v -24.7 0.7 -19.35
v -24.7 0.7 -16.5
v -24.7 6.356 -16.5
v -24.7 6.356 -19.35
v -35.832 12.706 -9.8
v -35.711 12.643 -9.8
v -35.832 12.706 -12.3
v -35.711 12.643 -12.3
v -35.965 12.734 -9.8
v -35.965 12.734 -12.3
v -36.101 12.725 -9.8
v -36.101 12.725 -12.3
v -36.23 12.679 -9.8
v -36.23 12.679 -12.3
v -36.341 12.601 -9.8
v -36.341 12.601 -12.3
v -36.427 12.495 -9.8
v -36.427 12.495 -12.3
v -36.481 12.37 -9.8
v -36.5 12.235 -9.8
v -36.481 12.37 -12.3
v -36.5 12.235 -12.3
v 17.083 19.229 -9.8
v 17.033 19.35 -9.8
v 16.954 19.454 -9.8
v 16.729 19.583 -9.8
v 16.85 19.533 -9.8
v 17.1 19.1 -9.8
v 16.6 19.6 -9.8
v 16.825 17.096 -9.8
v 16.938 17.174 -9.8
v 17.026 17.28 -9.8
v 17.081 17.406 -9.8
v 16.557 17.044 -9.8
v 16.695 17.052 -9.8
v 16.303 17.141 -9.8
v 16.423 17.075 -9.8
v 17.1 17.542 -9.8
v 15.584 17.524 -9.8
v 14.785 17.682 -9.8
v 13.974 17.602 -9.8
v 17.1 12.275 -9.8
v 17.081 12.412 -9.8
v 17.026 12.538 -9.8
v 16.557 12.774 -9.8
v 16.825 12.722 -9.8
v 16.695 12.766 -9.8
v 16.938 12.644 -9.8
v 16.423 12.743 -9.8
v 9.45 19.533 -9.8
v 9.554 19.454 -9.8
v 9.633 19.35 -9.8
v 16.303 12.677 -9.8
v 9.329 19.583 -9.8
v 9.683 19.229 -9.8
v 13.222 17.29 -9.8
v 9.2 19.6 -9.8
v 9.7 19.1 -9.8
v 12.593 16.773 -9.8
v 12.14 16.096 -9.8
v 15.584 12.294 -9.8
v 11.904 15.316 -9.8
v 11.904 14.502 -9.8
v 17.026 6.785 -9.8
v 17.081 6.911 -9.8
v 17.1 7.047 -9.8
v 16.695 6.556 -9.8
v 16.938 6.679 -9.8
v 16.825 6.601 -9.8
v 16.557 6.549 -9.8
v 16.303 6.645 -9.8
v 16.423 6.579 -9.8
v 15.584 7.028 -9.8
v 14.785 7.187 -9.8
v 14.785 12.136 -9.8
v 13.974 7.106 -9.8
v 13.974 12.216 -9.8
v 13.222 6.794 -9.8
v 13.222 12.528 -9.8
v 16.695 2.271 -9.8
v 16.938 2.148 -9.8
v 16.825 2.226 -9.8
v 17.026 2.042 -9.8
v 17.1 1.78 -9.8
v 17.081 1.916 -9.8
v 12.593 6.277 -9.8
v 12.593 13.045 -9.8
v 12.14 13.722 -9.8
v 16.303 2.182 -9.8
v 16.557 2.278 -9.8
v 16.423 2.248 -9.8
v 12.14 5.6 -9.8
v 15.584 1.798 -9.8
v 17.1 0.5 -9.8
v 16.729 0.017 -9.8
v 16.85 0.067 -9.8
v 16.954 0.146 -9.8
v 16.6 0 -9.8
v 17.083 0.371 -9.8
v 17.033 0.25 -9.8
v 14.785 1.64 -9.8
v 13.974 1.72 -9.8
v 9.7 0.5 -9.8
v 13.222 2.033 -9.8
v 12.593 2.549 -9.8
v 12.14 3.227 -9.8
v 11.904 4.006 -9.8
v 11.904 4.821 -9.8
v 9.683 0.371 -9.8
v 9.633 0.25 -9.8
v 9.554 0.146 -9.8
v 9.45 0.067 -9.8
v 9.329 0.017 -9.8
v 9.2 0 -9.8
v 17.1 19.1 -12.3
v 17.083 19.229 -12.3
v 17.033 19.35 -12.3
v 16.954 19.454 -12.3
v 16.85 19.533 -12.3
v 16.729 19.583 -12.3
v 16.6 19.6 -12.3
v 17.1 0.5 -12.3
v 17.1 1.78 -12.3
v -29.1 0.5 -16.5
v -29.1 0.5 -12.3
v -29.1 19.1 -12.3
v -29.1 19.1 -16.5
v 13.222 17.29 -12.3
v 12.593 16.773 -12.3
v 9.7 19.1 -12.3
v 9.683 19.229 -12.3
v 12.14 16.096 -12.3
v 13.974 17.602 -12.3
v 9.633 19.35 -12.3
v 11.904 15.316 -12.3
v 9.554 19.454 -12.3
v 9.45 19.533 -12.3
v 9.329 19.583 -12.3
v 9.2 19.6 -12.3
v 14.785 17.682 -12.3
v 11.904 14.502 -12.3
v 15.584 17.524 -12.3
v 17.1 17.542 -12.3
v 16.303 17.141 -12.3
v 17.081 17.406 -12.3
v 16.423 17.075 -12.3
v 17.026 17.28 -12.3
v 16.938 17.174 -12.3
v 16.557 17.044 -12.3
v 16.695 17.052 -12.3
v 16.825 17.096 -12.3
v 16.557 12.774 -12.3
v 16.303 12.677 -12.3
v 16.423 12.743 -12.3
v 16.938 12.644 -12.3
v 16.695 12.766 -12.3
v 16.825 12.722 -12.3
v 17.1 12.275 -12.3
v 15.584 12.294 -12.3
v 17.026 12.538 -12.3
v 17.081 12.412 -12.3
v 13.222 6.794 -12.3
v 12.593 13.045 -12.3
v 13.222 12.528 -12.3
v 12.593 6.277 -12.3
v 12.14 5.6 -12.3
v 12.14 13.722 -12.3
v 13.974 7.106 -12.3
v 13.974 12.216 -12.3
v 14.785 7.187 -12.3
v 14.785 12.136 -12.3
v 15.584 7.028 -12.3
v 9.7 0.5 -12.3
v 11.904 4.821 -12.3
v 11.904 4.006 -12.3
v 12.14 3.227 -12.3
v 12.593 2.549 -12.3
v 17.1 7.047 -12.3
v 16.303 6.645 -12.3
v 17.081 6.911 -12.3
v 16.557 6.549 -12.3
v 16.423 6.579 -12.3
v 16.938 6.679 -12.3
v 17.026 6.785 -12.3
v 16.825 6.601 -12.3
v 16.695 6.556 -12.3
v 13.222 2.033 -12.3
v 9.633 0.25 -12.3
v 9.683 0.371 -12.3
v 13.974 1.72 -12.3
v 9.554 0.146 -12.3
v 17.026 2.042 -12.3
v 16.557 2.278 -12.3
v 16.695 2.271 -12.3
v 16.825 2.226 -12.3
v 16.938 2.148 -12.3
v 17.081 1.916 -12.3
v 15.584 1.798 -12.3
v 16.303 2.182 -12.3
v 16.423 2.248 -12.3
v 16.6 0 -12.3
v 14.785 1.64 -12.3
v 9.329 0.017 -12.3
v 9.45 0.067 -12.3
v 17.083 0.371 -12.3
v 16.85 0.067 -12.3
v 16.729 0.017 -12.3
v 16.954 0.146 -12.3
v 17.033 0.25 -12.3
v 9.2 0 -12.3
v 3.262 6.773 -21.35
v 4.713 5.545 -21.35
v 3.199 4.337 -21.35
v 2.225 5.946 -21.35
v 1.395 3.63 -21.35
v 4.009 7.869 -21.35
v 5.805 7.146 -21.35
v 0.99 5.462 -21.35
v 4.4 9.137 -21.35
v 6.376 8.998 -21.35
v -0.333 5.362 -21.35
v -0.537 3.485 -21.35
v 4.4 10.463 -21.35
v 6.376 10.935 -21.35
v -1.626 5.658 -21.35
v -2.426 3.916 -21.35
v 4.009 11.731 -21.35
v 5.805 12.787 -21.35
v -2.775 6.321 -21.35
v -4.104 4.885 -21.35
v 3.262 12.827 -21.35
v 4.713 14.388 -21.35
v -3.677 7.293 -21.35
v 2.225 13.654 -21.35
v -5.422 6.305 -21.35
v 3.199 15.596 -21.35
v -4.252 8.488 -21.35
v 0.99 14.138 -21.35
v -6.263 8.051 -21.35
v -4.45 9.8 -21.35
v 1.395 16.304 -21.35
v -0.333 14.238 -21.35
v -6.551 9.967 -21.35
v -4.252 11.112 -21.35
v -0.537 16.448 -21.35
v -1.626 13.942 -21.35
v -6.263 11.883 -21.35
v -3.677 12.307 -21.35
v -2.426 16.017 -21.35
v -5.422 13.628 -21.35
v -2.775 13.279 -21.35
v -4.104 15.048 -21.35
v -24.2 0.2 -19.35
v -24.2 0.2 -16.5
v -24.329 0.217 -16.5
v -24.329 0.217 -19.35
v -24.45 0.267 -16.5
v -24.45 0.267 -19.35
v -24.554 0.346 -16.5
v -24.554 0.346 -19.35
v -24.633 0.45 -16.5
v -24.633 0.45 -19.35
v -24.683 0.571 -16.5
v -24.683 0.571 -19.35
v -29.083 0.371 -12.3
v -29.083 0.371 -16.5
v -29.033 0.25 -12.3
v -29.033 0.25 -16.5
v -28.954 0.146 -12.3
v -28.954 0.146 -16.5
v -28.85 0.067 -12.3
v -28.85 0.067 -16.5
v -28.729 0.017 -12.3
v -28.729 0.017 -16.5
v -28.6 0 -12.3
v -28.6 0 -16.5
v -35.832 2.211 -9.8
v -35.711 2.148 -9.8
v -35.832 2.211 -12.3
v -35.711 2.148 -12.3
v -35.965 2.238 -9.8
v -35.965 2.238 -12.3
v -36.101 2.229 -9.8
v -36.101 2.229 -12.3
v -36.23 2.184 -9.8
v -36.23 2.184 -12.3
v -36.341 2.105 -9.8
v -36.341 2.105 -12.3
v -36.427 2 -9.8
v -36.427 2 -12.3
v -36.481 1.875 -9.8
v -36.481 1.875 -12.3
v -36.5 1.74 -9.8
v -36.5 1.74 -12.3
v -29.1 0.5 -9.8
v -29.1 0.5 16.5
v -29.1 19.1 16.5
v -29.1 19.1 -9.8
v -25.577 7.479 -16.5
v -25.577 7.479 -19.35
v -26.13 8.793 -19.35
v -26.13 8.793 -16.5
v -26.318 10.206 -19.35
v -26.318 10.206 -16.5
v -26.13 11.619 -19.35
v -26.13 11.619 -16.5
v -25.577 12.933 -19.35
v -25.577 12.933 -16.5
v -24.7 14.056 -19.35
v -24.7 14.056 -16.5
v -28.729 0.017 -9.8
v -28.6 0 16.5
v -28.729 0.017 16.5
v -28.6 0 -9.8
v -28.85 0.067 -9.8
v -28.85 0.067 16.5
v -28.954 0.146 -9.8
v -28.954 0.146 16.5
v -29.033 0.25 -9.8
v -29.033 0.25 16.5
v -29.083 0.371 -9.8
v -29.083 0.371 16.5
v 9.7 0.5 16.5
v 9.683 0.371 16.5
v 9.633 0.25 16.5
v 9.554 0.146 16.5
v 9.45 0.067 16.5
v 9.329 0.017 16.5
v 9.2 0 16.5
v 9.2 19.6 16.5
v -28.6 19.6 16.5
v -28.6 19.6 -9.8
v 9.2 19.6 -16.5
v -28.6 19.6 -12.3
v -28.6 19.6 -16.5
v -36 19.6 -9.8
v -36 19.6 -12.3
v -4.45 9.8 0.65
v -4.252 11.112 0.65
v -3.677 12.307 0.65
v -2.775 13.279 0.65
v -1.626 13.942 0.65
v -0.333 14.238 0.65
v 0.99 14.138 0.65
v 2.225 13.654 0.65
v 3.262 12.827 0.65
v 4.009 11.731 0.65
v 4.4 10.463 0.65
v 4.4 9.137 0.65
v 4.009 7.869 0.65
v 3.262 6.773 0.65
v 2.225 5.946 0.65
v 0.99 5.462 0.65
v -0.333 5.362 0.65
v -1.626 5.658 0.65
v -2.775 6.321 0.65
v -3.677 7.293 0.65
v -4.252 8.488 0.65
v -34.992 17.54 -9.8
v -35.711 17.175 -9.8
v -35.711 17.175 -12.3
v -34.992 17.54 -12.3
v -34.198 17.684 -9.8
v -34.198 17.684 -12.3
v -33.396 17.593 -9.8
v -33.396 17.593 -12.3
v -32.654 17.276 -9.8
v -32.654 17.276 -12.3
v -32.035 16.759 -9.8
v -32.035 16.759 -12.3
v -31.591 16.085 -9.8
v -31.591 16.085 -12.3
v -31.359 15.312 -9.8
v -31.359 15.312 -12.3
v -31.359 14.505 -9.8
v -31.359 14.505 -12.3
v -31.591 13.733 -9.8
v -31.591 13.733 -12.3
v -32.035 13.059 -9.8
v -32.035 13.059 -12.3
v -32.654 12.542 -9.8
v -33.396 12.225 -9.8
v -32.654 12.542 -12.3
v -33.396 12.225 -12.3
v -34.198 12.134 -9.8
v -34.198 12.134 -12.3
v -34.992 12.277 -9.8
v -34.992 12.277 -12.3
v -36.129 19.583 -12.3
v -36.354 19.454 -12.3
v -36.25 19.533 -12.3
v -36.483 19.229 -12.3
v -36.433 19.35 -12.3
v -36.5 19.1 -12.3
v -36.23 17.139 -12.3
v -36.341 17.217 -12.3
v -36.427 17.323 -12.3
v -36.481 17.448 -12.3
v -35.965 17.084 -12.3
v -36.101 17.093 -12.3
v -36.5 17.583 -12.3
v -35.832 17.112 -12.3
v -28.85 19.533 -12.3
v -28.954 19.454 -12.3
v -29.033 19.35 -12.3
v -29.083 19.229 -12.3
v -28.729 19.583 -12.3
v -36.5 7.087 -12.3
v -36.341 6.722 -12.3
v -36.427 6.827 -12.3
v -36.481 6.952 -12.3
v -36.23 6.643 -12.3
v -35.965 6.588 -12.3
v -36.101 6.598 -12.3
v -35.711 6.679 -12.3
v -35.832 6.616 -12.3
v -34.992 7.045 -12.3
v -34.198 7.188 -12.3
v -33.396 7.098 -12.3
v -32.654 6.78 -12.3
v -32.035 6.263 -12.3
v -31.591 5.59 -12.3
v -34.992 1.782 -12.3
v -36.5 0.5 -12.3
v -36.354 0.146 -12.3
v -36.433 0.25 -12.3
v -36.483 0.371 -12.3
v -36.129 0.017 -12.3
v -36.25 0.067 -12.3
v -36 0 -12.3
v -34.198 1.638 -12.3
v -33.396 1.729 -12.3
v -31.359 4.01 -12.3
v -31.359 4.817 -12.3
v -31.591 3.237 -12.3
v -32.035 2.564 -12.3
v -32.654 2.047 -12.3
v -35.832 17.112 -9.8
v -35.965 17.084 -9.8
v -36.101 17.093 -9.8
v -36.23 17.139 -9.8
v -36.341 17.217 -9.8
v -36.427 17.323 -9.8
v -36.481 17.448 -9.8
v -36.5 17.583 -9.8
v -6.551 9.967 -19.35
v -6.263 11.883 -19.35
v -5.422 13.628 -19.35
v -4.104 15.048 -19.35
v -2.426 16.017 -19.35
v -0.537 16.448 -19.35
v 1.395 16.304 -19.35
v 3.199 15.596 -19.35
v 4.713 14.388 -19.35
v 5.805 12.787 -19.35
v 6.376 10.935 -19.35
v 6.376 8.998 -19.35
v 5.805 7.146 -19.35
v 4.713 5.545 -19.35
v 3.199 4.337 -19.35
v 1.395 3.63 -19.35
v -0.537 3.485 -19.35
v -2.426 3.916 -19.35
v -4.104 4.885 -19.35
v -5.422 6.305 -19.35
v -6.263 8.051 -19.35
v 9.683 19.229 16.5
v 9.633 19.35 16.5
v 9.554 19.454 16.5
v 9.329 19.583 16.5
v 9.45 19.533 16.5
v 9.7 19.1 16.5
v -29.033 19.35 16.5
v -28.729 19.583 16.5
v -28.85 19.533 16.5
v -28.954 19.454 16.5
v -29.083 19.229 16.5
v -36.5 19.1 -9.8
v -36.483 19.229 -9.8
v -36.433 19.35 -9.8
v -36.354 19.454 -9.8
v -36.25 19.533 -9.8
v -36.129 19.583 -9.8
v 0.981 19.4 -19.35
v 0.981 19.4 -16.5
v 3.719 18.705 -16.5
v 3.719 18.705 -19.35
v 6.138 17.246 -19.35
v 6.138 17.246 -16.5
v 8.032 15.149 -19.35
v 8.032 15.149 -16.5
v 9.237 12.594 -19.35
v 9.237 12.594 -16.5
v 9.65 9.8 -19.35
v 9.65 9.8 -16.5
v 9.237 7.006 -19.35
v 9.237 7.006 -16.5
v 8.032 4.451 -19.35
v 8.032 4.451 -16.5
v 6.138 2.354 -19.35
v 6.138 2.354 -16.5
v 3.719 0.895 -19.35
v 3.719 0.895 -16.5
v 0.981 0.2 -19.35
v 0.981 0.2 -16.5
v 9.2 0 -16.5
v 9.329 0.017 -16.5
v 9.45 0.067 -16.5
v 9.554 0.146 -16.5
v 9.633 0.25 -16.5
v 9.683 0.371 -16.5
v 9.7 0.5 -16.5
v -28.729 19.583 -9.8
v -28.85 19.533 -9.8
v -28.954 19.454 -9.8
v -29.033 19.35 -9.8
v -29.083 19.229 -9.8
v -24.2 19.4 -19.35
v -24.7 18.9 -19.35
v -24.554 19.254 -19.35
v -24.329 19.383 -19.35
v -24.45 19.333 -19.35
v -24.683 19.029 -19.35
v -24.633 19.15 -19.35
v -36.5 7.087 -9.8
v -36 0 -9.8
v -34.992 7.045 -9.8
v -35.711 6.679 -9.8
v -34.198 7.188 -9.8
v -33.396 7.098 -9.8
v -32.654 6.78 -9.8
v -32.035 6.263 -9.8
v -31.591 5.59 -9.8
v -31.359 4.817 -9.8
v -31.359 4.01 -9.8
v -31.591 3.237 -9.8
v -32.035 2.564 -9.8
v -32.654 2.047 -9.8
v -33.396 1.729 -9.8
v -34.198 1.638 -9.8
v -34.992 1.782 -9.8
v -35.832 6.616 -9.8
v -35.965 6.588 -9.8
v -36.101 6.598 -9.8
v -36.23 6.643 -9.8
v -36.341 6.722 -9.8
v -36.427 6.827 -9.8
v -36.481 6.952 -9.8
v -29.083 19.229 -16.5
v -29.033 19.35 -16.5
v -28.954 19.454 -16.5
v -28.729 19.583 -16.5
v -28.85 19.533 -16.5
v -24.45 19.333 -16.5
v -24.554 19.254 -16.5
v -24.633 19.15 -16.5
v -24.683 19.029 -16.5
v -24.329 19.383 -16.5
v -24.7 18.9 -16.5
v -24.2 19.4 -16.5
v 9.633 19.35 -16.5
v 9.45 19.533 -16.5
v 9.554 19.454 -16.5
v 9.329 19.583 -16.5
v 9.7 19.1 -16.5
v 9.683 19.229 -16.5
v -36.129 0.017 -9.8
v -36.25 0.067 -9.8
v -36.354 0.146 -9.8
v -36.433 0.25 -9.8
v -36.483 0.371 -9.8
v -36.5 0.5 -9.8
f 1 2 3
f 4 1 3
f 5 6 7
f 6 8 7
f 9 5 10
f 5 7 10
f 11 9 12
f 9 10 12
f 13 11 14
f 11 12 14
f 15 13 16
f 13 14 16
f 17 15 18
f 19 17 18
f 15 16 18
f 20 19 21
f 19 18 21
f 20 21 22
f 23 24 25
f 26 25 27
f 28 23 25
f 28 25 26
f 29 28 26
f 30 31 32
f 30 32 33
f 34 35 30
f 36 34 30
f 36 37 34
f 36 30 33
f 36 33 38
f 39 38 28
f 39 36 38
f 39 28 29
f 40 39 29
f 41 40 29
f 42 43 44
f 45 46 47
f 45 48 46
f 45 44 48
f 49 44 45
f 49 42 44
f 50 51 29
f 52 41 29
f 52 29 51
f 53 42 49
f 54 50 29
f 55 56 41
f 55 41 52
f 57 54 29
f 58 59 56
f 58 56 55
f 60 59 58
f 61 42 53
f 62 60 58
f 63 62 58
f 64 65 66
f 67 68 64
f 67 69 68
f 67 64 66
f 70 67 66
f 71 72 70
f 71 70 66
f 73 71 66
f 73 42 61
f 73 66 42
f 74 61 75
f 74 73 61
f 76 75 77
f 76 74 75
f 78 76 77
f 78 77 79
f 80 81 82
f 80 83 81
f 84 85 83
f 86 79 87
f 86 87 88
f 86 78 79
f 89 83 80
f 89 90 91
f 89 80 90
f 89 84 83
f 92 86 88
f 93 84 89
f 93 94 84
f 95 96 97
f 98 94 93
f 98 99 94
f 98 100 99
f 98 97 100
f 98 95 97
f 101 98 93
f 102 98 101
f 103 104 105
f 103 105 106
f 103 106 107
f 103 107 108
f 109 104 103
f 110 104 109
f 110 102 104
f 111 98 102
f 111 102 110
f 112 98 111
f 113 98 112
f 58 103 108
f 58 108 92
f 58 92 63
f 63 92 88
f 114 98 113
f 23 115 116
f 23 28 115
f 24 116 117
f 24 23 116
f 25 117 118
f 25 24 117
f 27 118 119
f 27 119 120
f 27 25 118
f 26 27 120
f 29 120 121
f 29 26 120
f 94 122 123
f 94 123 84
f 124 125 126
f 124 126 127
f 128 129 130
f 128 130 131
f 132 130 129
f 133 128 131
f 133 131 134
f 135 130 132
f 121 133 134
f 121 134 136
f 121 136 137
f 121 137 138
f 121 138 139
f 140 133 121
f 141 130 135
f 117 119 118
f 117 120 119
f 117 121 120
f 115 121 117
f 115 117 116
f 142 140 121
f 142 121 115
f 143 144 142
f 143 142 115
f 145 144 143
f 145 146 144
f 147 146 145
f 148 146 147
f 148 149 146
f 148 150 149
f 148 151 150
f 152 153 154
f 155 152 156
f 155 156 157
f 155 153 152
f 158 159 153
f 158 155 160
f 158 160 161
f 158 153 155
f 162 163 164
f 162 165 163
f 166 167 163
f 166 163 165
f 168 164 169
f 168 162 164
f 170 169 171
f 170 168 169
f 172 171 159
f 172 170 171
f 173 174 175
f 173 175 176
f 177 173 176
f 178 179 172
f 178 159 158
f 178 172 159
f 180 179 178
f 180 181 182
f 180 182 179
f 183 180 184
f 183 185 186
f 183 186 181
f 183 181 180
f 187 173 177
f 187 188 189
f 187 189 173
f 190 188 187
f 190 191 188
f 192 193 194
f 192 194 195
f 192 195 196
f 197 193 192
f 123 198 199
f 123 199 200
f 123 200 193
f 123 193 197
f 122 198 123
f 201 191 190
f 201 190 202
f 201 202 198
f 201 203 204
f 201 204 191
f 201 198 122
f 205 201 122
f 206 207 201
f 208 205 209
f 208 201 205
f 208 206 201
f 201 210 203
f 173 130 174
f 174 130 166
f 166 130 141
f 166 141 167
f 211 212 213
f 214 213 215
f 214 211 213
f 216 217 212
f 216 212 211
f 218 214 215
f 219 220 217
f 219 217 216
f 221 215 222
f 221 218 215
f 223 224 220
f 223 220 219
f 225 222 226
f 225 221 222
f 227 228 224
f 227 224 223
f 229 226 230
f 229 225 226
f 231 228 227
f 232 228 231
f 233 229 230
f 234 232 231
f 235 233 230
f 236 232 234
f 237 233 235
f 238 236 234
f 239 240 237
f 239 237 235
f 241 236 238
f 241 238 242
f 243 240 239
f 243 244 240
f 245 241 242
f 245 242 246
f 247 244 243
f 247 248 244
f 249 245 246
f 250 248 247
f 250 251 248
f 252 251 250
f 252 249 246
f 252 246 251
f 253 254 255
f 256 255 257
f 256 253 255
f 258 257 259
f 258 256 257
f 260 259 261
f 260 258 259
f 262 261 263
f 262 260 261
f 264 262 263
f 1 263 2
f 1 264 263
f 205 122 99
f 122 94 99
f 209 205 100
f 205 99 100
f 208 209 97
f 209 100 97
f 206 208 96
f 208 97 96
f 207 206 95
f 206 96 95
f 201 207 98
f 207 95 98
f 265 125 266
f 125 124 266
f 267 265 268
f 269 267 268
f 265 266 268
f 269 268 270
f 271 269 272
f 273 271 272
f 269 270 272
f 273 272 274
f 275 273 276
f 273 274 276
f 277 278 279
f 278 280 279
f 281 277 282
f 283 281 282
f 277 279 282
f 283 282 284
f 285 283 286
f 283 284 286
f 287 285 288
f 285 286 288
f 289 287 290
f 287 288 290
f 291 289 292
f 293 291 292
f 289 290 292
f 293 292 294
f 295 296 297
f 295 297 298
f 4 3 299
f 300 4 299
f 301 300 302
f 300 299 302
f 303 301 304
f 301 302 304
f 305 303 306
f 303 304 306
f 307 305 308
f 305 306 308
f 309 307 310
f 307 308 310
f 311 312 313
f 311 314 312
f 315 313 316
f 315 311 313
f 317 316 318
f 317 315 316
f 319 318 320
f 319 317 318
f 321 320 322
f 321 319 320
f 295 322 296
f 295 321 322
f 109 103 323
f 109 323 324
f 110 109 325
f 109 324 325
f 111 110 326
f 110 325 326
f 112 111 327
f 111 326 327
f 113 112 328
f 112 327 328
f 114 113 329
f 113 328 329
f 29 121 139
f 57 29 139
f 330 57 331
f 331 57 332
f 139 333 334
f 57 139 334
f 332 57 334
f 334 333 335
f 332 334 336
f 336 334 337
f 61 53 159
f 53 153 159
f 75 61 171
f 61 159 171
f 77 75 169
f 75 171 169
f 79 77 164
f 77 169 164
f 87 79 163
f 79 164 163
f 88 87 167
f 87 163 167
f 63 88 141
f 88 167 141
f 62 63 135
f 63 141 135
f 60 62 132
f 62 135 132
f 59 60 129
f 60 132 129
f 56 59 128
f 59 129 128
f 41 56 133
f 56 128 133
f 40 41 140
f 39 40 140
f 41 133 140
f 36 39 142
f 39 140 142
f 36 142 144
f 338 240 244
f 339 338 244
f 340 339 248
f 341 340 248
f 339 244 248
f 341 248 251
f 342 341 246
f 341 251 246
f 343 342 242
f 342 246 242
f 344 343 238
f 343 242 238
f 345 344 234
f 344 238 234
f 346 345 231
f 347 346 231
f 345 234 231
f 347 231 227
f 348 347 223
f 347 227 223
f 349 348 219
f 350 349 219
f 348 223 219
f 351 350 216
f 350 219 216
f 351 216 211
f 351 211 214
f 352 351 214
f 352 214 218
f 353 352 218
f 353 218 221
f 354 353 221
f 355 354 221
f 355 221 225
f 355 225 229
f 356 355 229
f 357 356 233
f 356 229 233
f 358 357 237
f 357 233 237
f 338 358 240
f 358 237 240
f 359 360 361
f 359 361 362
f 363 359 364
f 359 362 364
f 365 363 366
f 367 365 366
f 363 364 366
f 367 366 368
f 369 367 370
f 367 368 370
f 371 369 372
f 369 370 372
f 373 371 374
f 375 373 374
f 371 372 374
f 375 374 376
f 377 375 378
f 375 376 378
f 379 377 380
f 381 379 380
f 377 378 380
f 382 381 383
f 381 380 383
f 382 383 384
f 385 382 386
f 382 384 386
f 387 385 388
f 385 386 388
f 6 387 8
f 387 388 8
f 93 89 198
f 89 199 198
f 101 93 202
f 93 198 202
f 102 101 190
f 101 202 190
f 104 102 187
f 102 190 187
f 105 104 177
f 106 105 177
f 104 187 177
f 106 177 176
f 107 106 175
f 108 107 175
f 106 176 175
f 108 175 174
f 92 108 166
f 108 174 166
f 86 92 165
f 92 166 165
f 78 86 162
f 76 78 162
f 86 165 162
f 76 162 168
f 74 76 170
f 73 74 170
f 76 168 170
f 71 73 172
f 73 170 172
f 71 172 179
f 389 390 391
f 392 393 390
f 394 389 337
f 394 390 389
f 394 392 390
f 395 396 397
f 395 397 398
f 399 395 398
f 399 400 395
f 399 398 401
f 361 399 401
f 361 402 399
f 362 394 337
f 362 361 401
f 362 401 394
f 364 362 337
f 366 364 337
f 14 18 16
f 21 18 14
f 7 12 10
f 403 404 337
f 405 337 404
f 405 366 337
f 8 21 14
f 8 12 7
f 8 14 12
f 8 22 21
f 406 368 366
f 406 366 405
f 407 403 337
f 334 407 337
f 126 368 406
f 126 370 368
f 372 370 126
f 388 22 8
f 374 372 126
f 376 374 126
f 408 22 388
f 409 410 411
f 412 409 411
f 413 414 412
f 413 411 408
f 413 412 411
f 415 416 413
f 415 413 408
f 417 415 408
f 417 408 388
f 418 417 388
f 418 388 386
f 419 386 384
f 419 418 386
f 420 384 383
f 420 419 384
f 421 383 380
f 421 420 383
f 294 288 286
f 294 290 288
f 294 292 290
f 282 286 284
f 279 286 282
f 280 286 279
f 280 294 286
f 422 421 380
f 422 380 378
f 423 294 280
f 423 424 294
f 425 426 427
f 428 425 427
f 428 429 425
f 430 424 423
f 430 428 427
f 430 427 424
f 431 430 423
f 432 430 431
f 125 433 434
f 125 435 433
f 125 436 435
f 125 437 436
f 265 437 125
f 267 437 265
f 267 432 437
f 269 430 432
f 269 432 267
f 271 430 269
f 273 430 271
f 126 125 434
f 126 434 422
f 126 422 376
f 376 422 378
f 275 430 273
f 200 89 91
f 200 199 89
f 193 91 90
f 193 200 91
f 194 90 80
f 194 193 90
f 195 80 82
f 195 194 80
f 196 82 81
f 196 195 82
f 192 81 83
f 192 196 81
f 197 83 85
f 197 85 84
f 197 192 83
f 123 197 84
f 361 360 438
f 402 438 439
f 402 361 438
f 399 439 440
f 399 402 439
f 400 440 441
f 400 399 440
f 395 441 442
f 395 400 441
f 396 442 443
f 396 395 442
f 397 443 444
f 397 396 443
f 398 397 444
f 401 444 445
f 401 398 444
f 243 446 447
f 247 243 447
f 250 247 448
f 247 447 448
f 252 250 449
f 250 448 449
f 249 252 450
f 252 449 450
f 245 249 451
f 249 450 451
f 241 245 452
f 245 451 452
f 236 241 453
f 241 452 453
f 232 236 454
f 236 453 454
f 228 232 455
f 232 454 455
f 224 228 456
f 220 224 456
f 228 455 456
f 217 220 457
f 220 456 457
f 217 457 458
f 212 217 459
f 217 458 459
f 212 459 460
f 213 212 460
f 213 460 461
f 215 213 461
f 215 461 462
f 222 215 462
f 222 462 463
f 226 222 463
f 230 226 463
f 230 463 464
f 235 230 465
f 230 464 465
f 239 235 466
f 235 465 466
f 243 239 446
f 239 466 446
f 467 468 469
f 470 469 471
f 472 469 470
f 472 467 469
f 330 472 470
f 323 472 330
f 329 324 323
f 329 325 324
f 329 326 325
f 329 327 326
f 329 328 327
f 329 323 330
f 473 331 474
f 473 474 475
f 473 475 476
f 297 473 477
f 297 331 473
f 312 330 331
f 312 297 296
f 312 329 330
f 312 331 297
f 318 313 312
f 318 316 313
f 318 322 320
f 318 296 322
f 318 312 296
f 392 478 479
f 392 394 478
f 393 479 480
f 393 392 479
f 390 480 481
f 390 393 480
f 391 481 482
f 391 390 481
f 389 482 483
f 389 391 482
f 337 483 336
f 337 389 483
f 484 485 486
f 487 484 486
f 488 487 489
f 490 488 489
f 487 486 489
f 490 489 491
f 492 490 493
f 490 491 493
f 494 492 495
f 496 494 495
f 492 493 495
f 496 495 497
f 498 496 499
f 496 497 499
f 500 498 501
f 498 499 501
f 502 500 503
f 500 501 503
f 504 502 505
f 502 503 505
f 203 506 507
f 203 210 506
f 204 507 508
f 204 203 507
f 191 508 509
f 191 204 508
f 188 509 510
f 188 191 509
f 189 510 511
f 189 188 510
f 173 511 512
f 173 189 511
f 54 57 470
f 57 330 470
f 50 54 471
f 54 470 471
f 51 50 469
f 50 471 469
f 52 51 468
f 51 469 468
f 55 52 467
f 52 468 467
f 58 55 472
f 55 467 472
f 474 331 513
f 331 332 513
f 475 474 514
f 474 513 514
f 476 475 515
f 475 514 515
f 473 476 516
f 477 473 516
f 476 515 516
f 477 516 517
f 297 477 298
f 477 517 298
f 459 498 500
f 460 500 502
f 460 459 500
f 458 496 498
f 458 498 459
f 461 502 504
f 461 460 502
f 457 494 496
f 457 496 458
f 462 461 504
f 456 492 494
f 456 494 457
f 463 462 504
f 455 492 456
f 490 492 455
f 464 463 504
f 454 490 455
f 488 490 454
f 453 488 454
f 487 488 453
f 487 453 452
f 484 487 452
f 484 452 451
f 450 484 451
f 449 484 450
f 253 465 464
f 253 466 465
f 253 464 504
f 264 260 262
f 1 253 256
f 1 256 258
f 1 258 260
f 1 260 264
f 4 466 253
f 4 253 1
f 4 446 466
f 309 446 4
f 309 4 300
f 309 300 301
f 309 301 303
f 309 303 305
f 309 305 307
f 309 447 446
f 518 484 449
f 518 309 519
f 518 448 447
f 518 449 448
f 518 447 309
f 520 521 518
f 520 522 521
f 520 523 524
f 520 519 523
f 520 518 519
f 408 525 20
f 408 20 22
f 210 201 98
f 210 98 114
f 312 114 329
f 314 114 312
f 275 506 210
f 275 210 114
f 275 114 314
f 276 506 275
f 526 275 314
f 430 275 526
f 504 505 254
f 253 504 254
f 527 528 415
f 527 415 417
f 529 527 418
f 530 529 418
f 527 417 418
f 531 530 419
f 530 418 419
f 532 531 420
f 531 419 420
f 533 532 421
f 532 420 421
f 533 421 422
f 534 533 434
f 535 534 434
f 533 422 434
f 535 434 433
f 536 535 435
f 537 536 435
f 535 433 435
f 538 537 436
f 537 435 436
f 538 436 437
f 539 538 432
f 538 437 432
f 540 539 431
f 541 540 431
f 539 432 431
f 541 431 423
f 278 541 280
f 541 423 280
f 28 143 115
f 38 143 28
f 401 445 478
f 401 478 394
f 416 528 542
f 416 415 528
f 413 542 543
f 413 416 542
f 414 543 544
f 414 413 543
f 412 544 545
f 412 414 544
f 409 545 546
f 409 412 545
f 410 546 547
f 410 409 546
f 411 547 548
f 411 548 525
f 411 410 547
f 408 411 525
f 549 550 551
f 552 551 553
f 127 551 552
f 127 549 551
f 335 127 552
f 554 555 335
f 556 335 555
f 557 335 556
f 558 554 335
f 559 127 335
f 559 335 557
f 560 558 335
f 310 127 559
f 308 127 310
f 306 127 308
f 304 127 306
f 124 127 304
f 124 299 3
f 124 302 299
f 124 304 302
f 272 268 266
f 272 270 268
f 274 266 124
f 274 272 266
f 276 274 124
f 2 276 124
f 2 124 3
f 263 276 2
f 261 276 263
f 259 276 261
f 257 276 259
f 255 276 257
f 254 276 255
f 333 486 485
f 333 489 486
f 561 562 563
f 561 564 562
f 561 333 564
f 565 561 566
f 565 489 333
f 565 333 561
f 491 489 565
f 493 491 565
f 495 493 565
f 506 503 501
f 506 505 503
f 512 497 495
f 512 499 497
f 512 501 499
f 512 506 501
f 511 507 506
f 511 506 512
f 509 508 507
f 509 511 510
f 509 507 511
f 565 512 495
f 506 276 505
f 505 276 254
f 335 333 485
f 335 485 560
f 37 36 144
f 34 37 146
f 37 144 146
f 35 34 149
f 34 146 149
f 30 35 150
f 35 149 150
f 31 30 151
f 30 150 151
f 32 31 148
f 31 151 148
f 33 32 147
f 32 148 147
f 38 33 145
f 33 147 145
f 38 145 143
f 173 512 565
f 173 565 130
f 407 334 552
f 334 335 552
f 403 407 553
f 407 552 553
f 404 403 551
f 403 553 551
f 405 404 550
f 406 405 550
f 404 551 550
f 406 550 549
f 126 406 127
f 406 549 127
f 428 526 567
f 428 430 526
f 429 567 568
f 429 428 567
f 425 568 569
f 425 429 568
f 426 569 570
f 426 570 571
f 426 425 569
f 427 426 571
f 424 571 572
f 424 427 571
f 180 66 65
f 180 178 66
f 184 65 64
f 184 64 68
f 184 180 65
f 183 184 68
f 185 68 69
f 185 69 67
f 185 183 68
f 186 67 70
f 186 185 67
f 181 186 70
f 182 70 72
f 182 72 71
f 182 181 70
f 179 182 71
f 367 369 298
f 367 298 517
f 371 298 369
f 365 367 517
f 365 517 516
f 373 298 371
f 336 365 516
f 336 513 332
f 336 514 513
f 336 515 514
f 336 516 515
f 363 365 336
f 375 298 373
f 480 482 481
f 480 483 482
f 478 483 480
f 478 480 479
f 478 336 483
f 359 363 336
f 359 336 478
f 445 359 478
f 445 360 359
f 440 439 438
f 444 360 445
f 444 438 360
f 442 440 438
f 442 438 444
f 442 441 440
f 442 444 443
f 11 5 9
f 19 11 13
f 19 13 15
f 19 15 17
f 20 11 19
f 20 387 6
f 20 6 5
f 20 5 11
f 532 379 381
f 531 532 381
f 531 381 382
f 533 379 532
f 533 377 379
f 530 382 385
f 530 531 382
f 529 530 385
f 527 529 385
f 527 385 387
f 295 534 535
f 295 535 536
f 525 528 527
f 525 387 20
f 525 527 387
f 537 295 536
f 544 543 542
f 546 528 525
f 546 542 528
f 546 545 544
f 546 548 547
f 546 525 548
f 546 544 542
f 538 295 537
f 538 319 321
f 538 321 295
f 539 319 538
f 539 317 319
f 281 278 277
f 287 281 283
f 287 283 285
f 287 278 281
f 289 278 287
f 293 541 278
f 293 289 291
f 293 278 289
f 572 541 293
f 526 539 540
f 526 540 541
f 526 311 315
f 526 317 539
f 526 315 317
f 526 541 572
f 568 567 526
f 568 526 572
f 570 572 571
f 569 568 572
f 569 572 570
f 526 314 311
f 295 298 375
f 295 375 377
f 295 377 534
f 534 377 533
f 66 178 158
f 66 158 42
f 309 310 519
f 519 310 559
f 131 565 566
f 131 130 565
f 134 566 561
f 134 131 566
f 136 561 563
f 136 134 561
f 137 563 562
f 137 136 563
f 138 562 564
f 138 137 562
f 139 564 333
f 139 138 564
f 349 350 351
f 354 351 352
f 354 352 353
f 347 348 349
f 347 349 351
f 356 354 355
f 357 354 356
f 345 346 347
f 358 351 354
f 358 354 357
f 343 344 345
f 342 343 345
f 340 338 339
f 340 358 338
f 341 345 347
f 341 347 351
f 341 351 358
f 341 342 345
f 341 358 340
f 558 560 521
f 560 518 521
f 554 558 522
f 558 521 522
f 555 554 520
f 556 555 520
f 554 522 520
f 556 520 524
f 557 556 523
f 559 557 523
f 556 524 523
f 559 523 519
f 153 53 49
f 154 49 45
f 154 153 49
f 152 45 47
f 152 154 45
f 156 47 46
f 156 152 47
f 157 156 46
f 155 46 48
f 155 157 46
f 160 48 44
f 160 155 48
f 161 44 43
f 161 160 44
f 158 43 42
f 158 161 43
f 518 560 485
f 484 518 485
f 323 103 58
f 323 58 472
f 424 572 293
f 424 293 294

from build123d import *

# Parameters (mm, degrees)
EXTRUS_O1_DEPTH = 19.6
EXTRUS_O2_DEPTH = 2.85
FILETE1_R       = 0.5
FILETE2_R       = 0.5
FILETE3_R       = 0.5
FILETE4_R       = 0.5
FILETE5_R       = 0.5
FILETE6_R       = 0.5
FILETE7_R       = 0.5
FILETE8_R       = 0.5
FILETE9_R       = 0.5
FILETE10_R      = 0.5
FILETE11_R      = 0.5
FILETE12_R      = 0.5
FILETE13_R      = 0.5
FILETE14_R      = 0.5
ESBO_O3_R       = 6.5
EXTRUS_O3_DEPTH = 2
ESBO_O4_R       = 4.45
EXTRUS_O4_DEPTH = 22
ESBO_O5_R       = 2.776577301
EXTRUS_O6_DEPTH = 10
FILETE15_R      = 0.5
FILETE16_R      = 0.5
FILETE17_R      = 0.5
FILETE18_R      = 0.5
FILETE19_R      = 0.5
FILETE20_R      = 0.5
FILETE21_R      = 0.5
FILETE22_R      = 0.5


with BuildPart() as part:
    # Esboço1 → Extrusão1 (new body)
    with BuildSketch(Plane(origin=(0, 0, 0), x_dir=(1, 0, 0), z_dir=(0, 1, 0))):
        Polygon((9.7, 12.3), (17.1, 12.3), (17.1, 9.8), (9.7, 9.8), (9.7, -16.5), (-29.1, -16.5), (-29.1, 9.8), (-36.5, 9.8), (-36.5, 12.3), (-29.1, 12.3), (-29.1, 16.5), (9.7, 16.5), align=None)
    extrude(amount=EXTRUS_O1_DEPTH)

    # Esboço2 → Extrusão2 (add)
    with BuildSketch(Plane(origin=(0, 0, -16.5), x_dir=(-1, 0, 0), z_dir=(0, 0, -1))):
        with BuildLine():
            Line((24.7, 19.4), (-0.981070844, 19.4))
            ThreePointArc((-0.981070844, 19.4), (-9.65, 9.8), (-0.981070844, 0.2))
            Line((-0.981070844, 0.2), (24.7, 0.2))
            Line((24.7, 0.2), (24.7, 6.356001076))
            ThreePointArc((24.7, 6.356001076), (26.318276276, 10.206001076), (24.7, 14.056001076))
            Line((24.7, 14.056001076), (24.7, 19.4))
        make_face()
    extrude(amount=EXTRUS_O2_DEPTH)

    # Filete1
    filete1_edges = [part.edges().sort_by_distance(p)[0] for p in [
        (17.1, 0, -11.05),
    ]]
    fillet(filete1_edges, radius=FILETE1_R)

    # Filete2
    filete2_edges = [part.edges().sort_by_distance(p)[0] for p in [
        (17.1, 19.6, -11.05),
    ]]
    fillet(filete2_edges, radius=FILETE2_R)

    # Filete3
    filete3_edges = [part.edges().sort_by_distance(p)[0] for p in [
        (-36.5, 0, -11.05),
    ]]
    fillet(filete3_edges, radius=FILETE3_R)

    # Filete4
    filete4_edges = [part.edges().sort_by_distance(p)[0] for p in [
        (-36.5, 19.6, -11.05),
    ]]
    fillet(filete4_edges, radius=FILETE4_R)

    # Filete5
    filete5_edges = [part.edges().sort_by_distance(p)[0] for p in [
        (-24.7, 0.2, -17.925),
    ]]
    fillet(filete5_edges, radius=FILETE5_R)

    # Filete6
    filete6_edges = [part.edges().sort_by_distance(p)[0] for p in [
        (-24.7, 19.4, -17.925),
    ]]
    fillet(filete6_edges, radius=FILETE6_R)

    # Filete7
    filete7_edges = [part.edges().sort_by_distance(p)[0] for p in [
        (-29.1, 0, 3.35),
    ]]
    fillet(filete7_edges, radius=FILETE7_R)

    # Filete8
    filete8_edges = [part.edges().sort_by_distance(p)[0] for p in [
        (-29.1, 19.6, 3.35),
    ]]
    fillet(filete8_edges, radius=FILETE8_R)

    # Filete9
    filete9_edges = [part.edges().sort_by_distance(p)[0] for p in [
        (9.7, 19.6, 3.35),
    ]]
    fillet(filete9_edges, radius=FILETE9_R)

    # Filete10
    filete10_edges = [part.edges().sort_by_distance(p)[0] for p in [
        (9.7, 0, 3.35),
    ]]
    fillet(filete10_edges, radius=FILETE10_R)

    # Filete11
    filete11_edges = [part.edges().sort_by_distance(p)[0] for p in [
        (-29.1, 0, -14.4),
    ]]
    fillet(filete11_edges, radius=FILETE11_R)

    # Filete12
    filete12_edges = [part.edges().sort_by_distance(p)[0] for p in [
        (-29.1, 19.6, -14.4),
    ]]
    fillet(filete12_edges, radius=FILETE12_R)

    # Filete13
    filete13_edges = [part.edges().sort_by_distance(p)[0] for p in [
        (9.7, 19.6, -14.4),
    ]]
    fillet(filete13_edges, radius=FILETE13_R)

    # Filete14
    filete14_edges = [part.edges().sort_by_distance(p)[0] for p in [
        (9.7, 0, -14.4),
    ]]
    fillet(filete14_edges, radius=FILETE14_R)

    # Esboço3 → Extrusão3 (add)
    with BuildSketch(Plane(origin=(0, 0, -19.35), x_dir=(-1, 0, 0), z_dir=(0, 0, -1))):
        with Locations((0.051438127, 9.966594638)):
            Circle(ESBO_O3_R)
    extrude(amount=EXTRUS_O3_DEPTH)

    # Esboço4 → Extrusão4 (cut)
    with BuildSketch(Plane(origin=(0, 0, -21.35), x_dir=(-1, 0, 0), z_dir=(0, 0, -1))):
        with Locations((0, 9.8)):
            Circle(ESBO_O4_R)
    extrude(amount=-EXTRUS_O4_DEPTH, mode=Mode.SUBTRACT)

    # Esboço5 → Extrusão6 (cut)
    with BuildSketch(Plane(origin=(0, 0, -12.3), x_dir=(-1, 0, 0), z_dir=(0, 0, -1))):
        with Locations((-14.650582931, 14.908902234)):
            Circle(ESBO_O5_R)
        with Locations((-14.650582931, 4.413440036)):
            Circle(ESBO_O5_R)
        with Locations((34.106114477, 14.908902234)):
            Circle(ESBO_O5_R)
        with Locations((34.106114477, 4.413440036)):
            Circle(ESBO_O5_R)
    extrude(amount=-EXTRUS_O6_DEPTH, mode=Mode.SUBTRACT)

    # Filete15
    filete15_edges = [part.edges().sort_by_distance(p)[0] for p in [
        (17.1, 5.721009358, -11.05),
    ]]
    fillet(filete15_edges, radius=FILETE15_R)

    # Filete16
    filete16_edges = [part.edges().sort_by_distance(p)[0] for p in [
        (17.1, 3.105870713, -11.05),
    ]]
    fillet(filete16_edges, radius=FILETE16_R)

    # Filete17
    filete17_edges = [part.edges().sort_by_distance(p)[0] for p in [
        (17.1, 16.216471557, -11.05),
    ]]
    fillet(filete17_edges, radius=FILETE17_R)

    # Filete18
    filete18_edges = [part.edges().sort_by_distance(p)[0] for p in [
        (17.1, 13.601332911, -11.05),
    ]]
    fillet(filete18_edges, radius=FILETE18_R)

    # Filete19
    filete19_edges = [part.edges().sort_by_distance(p)[0] for p in [
        (-36.5, 16.315562682, -11.05),
    ]]
    fillet(filete19_edges, radius=FILETE19_R)

    # Filete20
    filete20_edges = [part.edges().sort_by_distance(p)[0] for p in [
        (-36.5, 13.502241787, -11.05),
    ]]
    fillet(filete20_edges, radius=FILETE20_R)

    # Filete21
    filete21_edges = [part.edges().sort_by_distance(p)[0] for p in [
        (-36.5, 3.006779588, -11.05),
    ]]
    fillet(filete21_edges, radius=FILETE21_R)

    # Filete22
    filete22_edges = [part.edges().sort_by_distance(p)[0] for p in [
        (-36.5, 5.820100483, -11.05),
    ]]
    fillet(filete22_edges, radius=FILETE22_R)


solid = part.part
